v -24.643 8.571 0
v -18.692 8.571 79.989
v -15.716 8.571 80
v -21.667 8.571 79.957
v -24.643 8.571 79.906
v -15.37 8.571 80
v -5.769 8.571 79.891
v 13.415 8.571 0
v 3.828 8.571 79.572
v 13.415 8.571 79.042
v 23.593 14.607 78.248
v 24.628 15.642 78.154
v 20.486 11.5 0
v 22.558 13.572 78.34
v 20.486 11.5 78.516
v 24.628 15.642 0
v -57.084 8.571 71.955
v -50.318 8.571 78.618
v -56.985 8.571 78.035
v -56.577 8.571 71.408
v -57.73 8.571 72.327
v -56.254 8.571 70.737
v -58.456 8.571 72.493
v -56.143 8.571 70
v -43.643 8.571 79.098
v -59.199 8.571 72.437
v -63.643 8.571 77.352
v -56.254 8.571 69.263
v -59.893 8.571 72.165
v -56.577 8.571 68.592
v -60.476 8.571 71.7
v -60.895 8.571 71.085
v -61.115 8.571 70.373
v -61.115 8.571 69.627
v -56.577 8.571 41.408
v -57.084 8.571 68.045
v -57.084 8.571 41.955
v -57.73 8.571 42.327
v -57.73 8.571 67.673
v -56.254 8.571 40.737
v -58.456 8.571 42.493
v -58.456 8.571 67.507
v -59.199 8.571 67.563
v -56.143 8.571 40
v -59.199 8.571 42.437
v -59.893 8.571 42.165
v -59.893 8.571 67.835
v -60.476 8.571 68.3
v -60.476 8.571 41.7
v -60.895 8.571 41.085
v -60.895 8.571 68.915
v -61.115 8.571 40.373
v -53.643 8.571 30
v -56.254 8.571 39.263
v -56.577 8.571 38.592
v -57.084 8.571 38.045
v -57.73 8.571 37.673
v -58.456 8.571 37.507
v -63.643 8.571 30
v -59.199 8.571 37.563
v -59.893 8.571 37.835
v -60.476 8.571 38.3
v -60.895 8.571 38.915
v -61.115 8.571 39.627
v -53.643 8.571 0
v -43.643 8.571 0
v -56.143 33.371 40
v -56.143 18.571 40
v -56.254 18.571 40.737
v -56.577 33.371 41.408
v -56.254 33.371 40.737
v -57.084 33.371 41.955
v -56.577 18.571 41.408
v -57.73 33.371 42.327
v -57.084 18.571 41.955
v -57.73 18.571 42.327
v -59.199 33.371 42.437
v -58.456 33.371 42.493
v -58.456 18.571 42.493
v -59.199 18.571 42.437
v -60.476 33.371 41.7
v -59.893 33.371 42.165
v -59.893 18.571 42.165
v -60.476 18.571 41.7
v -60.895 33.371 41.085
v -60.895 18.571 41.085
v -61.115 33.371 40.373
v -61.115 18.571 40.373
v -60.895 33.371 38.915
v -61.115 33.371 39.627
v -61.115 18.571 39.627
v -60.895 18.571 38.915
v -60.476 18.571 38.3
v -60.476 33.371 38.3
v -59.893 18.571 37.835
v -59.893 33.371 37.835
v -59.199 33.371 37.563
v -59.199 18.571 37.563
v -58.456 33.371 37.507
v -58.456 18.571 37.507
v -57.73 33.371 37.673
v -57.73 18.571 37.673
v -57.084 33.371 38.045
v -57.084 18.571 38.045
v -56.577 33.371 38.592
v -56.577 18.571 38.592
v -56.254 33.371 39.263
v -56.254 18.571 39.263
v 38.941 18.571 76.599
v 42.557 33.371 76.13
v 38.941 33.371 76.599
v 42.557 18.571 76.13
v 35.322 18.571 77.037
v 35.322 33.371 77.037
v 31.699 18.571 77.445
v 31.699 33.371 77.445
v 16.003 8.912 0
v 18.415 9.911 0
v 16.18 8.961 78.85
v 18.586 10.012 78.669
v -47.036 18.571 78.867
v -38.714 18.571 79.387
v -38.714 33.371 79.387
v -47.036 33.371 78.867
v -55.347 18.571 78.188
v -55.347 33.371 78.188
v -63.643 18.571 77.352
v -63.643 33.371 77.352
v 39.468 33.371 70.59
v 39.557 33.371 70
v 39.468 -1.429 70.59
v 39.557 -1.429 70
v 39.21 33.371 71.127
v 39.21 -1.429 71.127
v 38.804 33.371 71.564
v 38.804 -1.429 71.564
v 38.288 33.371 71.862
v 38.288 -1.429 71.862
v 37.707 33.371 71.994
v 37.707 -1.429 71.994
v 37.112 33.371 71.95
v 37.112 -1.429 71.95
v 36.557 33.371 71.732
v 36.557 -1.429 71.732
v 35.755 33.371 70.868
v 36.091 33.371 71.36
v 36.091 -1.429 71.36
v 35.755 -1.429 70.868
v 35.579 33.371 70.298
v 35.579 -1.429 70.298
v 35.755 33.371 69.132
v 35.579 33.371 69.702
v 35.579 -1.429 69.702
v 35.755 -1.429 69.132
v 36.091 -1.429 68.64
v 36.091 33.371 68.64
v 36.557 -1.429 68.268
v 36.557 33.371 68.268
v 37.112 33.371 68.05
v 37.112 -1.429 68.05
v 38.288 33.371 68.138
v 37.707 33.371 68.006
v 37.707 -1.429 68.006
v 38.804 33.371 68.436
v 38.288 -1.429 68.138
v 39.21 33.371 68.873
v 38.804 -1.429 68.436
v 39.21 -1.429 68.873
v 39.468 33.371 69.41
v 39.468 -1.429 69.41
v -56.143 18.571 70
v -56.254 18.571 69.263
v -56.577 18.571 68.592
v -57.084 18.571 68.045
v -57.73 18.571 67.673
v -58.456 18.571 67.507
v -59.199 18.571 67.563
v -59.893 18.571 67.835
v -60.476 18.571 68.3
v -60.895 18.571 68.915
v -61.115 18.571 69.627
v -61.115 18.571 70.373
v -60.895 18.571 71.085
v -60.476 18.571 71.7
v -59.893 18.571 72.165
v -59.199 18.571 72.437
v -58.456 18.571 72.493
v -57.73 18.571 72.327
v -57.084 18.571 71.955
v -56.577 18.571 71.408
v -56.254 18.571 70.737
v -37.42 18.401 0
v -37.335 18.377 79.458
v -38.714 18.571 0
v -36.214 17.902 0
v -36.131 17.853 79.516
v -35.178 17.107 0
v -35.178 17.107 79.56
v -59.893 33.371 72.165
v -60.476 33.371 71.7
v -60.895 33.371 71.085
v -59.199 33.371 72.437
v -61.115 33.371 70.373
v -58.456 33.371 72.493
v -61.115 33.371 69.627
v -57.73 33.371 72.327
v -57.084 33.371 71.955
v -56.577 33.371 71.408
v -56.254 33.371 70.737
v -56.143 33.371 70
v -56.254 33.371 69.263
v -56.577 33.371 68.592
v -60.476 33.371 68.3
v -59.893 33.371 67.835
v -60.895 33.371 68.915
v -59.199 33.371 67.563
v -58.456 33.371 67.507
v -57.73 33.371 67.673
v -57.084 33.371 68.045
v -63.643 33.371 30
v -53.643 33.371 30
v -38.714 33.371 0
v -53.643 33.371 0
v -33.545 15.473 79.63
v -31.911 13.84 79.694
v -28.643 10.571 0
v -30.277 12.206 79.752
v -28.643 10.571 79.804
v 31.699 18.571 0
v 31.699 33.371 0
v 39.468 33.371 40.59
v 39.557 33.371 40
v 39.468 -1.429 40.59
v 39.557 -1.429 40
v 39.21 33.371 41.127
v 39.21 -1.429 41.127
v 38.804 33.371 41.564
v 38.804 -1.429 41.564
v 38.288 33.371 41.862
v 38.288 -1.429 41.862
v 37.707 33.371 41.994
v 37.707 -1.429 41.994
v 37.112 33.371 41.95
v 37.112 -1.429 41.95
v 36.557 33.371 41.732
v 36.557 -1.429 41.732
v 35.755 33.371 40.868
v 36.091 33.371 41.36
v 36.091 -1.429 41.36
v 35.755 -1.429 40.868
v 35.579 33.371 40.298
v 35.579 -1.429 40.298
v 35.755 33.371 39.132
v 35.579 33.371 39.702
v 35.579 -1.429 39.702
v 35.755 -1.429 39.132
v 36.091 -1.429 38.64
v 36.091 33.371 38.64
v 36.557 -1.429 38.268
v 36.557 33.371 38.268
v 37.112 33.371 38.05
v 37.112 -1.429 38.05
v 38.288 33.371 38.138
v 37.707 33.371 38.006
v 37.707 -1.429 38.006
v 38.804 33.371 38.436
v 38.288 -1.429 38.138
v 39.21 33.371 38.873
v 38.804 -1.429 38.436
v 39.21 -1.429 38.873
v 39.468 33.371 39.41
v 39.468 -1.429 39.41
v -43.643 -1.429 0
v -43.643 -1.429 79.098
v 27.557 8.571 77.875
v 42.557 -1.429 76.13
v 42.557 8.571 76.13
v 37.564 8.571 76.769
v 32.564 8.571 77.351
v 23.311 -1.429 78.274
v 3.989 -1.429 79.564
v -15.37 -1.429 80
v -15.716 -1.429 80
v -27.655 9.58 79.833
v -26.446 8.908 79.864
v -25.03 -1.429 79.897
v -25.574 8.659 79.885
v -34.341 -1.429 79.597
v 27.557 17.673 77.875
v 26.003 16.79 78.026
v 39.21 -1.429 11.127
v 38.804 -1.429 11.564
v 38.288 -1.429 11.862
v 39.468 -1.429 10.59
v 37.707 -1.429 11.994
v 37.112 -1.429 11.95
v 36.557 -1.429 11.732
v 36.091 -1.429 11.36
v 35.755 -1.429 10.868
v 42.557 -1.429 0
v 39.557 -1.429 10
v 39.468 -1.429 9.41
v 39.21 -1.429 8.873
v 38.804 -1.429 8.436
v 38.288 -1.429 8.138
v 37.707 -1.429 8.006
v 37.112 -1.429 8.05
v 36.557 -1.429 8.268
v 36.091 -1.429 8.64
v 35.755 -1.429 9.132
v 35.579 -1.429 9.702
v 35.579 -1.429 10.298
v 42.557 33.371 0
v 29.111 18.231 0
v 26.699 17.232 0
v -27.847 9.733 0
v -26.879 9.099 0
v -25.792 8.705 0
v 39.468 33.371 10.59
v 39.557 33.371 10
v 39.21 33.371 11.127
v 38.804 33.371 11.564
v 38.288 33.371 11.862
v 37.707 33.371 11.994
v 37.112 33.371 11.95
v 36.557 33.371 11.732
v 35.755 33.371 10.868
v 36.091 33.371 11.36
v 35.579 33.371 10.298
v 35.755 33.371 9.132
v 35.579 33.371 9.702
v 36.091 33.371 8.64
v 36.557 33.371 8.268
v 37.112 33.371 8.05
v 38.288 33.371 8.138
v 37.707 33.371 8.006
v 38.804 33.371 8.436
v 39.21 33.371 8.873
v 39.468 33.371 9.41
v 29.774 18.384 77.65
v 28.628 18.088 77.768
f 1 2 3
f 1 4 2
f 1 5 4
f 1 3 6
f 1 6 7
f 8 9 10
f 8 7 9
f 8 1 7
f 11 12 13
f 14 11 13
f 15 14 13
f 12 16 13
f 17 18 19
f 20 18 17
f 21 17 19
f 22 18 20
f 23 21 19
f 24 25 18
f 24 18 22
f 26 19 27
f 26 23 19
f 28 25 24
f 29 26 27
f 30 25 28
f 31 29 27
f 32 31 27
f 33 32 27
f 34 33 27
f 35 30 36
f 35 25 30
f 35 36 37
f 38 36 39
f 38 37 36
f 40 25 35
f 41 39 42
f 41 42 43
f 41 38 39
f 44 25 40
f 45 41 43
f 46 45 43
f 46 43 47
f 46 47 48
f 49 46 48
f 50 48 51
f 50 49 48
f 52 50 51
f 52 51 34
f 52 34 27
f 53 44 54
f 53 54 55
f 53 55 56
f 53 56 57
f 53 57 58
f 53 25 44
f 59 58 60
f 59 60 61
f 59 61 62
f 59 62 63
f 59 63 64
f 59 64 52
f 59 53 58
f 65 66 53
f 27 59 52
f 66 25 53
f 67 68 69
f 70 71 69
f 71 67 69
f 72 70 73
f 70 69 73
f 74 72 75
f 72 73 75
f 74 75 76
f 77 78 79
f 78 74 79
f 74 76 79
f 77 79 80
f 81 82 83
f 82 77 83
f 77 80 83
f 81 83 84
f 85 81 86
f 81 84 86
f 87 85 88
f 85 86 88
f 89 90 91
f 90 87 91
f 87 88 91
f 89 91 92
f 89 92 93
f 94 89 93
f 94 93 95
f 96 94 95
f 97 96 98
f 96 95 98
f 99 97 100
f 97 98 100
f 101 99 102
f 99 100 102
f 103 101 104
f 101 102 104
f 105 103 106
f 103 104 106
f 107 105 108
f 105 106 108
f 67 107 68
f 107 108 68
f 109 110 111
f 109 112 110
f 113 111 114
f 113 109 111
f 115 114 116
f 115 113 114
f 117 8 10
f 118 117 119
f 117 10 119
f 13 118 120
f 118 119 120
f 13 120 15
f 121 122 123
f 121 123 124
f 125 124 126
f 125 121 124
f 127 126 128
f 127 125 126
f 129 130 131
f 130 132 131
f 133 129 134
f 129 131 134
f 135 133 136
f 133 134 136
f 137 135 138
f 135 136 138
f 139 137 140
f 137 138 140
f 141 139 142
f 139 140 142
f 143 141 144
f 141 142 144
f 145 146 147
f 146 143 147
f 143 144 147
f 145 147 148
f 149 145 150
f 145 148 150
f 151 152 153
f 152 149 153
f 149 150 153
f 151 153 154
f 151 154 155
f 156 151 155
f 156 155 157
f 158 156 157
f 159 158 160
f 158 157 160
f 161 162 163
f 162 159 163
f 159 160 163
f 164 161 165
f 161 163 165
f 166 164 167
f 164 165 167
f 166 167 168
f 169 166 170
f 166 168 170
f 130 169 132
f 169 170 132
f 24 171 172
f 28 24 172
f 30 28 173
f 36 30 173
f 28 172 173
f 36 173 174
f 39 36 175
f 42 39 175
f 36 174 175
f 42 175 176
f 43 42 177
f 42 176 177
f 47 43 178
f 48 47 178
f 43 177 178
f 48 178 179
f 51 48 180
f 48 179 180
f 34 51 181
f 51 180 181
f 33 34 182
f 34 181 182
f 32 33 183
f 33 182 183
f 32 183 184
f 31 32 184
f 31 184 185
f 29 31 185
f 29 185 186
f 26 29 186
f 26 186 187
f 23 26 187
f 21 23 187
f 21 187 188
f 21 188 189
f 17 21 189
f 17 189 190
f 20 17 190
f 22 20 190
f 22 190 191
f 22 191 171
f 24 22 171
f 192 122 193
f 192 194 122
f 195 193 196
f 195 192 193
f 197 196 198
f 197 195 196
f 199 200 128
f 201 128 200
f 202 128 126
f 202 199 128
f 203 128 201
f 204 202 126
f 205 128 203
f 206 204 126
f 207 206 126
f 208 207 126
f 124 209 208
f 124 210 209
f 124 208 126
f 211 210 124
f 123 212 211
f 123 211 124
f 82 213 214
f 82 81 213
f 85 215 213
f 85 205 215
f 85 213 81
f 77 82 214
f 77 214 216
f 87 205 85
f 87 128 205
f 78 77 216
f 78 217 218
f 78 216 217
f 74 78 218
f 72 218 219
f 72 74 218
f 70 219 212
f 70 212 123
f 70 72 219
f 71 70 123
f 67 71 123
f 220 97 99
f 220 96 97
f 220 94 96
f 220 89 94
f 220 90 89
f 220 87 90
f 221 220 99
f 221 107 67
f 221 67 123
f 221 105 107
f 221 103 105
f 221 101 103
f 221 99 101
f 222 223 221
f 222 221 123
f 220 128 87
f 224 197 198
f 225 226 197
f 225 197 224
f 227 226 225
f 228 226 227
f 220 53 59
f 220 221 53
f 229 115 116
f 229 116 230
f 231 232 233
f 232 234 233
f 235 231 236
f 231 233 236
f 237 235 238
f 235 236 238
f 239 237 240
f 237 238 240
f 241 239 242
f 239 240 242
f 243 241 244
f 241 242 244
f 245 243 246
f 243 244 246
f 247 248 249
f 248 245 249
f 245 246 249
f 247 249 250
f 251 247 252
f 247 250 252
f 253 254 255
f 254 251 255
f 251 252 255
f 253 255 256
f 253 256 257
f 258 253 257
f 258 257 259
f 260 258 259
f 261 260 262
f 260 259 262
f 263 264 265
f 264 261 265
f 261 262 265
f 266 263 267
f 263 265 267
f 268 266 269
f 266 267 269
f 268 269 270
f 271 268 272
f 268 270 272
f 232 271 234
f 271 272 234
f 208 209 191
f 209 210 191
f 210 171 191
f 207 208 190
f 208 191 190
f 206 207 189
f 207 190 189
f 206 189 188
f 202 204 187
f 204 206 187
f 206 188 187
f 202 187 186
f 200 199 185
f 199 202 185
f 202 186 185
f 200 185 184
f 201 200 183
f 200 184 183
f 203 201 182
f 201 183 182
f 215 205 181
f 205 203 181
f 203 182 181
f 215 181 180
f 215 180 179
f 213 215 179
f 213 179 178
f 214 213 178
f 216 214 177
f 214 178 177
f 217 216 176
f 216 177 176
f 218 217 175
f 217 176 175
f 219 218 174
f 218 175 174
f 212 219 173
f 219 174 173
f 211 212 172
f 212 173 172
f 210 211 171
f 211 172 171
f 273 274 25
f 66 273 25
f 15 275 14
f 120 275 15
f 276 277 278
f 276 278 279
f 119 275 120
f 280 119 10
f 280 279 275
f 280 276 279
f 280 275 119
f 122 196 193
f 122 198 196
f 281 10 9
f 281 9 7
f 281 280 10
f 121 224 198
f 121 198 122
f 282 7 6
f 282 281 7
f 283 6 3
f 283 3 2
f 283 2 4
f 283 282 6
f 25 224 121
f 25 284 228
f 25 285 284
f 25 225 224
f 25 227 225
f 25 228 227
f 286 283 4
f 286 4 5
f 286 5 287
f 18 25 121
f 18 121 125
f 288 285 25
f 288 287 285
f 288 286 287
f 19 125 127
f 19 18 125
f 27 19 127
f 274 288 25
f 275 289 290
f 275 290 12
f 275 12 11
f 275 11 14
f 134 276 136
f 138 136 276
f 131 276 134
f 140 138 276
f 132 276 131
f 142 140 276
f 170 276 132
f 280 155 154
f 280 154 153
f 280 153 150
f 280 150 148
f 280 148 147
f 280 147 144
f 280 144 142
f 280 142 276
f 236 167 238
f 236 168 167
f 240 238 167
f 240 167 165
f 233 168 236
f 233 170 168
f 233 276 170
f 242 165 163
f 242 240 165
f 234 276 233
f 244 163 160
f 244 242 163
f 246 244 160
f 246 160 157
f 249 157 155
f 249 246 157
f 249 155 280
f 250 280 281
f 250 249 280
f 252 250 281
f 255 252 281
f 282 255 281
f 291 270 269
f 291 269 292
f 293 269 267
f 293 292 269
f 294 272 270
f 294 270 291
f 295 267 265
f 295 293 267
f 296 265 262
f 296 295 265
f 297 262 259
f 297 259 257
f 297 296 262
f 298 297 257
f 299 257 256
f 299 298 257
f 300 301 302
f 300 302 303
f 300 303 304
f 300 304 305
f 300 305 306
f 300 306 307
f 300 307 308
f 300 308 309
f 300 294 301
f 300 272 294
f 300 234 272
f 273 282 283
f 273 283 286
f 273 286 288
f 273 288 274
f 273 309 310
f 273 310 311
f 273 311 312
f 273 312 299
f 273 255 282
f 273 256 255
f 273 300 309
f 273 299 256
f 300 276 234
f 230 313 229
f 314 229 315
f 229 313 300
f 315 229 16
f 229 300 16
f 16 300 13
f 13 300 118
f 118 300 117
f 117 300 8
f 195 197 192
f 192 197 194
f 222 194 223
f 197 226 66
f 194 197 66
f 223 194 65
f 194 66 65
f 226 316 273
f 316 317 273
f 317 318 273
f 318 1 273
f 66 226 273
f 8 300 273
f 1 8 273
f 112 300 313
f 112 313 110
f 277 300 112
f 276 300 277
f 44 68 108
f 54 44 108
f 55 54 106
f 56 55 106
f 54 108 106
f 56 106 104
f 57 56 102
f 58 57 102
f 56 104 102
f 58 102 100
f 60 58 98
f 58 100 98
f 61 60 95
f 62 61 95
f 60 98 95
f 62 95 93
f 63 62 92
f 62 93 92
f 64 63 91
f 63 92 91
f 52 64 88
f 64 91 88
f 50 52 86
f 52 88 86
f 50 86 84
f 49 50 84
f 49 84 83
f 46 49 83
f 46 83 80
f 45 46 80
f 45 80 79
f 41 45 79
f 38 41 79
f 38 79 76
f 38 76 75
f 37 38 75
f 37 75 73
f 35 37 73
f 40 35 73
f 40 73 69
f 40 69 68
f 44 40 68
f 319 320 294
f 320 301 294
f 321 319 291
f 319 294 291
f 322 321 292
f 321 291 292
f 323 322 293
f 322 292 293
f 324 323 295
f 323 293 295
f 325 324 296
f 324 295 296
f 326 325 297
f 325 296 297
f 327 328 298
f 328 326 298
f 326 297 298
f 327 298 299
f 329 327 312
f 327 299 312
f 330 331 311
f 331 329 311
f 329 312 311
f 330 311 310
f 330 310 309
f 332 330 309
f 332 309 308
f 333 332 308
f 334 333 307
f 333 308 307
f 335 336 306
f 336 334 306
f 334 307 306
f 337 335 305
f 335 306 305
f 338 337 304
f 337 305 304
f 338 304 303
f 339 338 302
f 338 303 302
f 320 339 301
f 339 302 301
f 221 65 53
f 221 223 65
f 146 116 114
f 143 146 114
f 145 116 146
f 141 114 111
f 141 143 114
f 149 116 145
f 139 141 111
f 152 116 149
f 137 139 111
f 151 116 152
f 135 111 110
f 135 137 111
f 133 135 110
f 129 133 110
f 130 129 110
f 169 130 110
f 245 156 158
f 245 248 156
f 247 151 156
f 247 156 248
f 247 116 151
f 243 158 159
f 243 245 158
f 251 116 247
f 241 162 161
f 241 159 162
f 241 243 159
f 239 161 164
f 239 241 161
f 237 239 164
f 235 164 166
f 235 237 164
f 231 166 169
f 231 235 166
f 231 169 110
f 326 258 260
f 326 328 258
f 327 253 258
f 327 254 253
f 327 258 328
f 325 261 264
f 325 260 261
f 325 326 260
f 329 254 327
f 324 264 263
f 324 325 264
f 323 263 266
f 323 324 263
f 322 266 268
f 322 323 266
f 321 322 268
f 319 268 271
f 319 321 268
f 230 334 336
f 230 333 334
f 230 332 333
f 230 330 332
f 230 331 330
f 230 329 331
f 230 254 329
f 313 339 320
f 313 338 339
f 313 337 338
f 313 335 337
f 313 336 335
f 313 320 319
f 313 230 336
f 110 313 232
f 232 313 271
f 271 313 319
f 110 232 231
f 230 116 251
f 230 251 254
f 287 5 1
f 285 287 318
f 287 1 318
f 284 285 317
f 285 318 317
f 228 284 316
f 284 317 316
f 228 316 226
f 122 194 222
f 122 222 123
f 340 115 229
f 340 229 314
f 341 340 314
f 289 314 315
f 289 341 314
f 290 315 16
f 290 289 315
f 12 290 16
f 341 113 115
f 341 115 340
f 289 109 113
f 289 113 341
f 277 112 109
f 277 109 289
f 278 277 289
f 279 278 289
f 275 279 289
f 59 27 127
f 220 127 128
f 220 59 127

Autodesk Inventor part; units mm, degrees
ref_plane "YZ Plane" through (0, 0, 0) normal (1, 0, 0) x (0, 1, 0)
ref_plane "XZ Plane" through (0, 0, 0) normal (0, 1, 0) x (-1, 0, 0)
ref_plane "XY Plane" through (0, 0, 0) normal (0, 0, 1) x (1, 0, 0)
sketch "Sketch1" plane through (0, 0, 0) normal (0, 0, 1) x (1, 0, 0)
  line L0 (-43.6429, 8.5714) -> (-63.6429, 8.5714)
  line L1 (-63.6429, 8.5714) -> (-63.6429, 18.5714)
  line L2 (-63.6429, 18.5714) -> (-28.6429, 18.5714)
  line L3 (-28.6429, 18.5714) -> (-28.6429, 8.5714)
  line L4 (-28.6429, 8.5714) -> (42.5571, 8.5714)
  line L5 (42.5571, 8.5714) -> (42.5571, -1.4286)
  line L6 (42.5571, -1.4286) -> (-43.6429, -1.4286)
  line L7 (-43.6429, -1.4286) -> (-43.6429, 8.5714)
  point P0 (0, 0)
  dimension "d0" = 10
  dimension "d1" = 10
  dimension "d2" = 20
  dimension "d3" = 86.2
  dimension "d4" = 15
extrude "Extrusion1" add sketch "Sketch1" along normal blind 80
chamfer "Chamfer1" distance 8 angle 45 1 edges at (-28.6429, 18.5714, 40)
fillet "Fillet1" radius 5 2 edges at (-36.6429, 18.5714, 40) (-28.6429, 8.5714, 40)
sketch "Sketch2" plane through (-63.6429, 18.5714, 80) normal (0, 1, 0) x (1, 0, 0)
  circle A0 centre (5, 10) radius 2.5
  circle A1 centre (5, 40) radius 2.5
  line L0 (24.9289, 0) -> (0, 0) projected
  line L1 (0, 80) -> (0, 0) projected
  line L2 (0, 80) -> (20, 80) projected
  line L3 (20, 80) -> (20, 0) projected
  line L4 (0, 80) -> (10, 80)
  line L5 (10, 80) -> (10, 50)
  line L6 (10, 50) -> (0, 50)
  line L7 (0, 50) -> (0, 80)
  point P0 (63.6429, 80)
  point P1 (20, 50)
  point P2 (0, 50)
  point P3 (10, 80)
  dimension "d11" = 10
  dimension "d12" = 40
  dimension "d13" = 5
  dimension "d14" = 5
  dimension "d15" = 5
  dimension "d16" = 5
  dimension "d31" = 10
extrude "Extrusion2" cut sketch "Sketch2" against normal blind 10 contours A0 | A1 | L1 L2 L5 L6
sketch "Sketch3" plane through (42.5571, 8.5714, 80) normal (0, 1, 0) x (1, 0, 0)
  circle A0 centre (-5, 10) radius 2
  circle A1 centre (-5, 40) radius 2
  circle A2 centre (-5, 70) radius 2
  line L0 (0, 80) -> (0, 0) projected
  line L1 (0, 80) -> (-67.2, 80) projected
  line L2 (0, 0) -> (-67.2, 0) projected
  point P0 (-42.5571, 80)
  dimension "d20" = 4
  dimension "d21" = 4
  dimension "d22" = 4
  dimension "d23" = 5
  dimension "d24" = 5
  dimension "d25" = 5
  dimension "d26" = 10
  dimension "d27" = 40
  dimension "d28" = 10
extrude "Extrusion3" cut sketch "Sketch3" against normal blind 10
sketch "Sketch4" plane through (42.5571, 8.5714, 80) normal (0, 1, 0) x (1, 0, 0)
  arc A0 (-125.8221, 5.2659) -> (2.953, 4.275) centre (-58.1, 438.1) ccw
  line L0 (0, 0) -> (-67.2, 0) projected
  line L1 (0, 80) -> (0, 0) projected
  line L2 (2.953, 4.275) -> (3.8116, -7.869)
  line L3 (3.8116, -7.869) -> (-122.3226, -7.869)
  line L4 (-122.3226, -7.869) -> (-125.8221, 5.2659)
  point P0 (-42.5571, 80)
  point P1 (0, 3.8696)
  point P2 (-58.1, 0)
  point P3 (-0.5169, 0)
  dimension "d32" = 876.2
  dimension "d33" = 0
  dimension "d34" = 58.1
extrude "Extrusion4" cut sketch "Sketch4" along normal through all both and the other way through all
sketch "Sketch5" plane through (-24.6429, 8.5714, 0) normal (0, 1, 0) x (1, 0, 0)
  circle A0 centre (62.2, -70) radius 2 projected
  circle A1 centre (62.2, -70) radius 2
  circle A2 centre (62.2, -40) radius 2 projected
  circle A3 centre (62.2, -40) radius 2
  circle A4 centre (62.2, -10) radius 2 projected
  circle A5 centre (62.2, -10) radius 2
  line L0 (67.2, 0) -> (67.2, -80) projected
  line L1 (67.2, -76.1304) -> (67.2, 0)
  line L2 (67.2, 0) -> (52.2, 0)
  line L3 (67.2, 0) -> (0, 0) projected
  line L4 (52.2, 0) -> (52.2, -77.8748)
  arc A6 (-19, -79.0979) -> (67.2, -76.1304) centre (9.1, 358.1) ccw projected
  arc A7 (-55.9, -73.5326) -> (94.1, -73.5326) centre (19.1, 358.0999) ccw projected
  arc A8 (-55.9, -73.5326) -> (94.1, -73.5326) centre (19.1, 358.0999) ccw projected
  arc A9 (-55.9, -73.5326) -> (94.1, -73.5326) centre (19.1, 358.0999) ccw projected
  circle A10 centre (-30.9, 438.0999) radius 2 projected
  circle A11 centre (-30.9, 308.0999) radius 2 projected
  circle A12 centre (69.1, 278.0999) radius 2 projected
  circle A13 centre (69.1, 308.0999) radius 2 projected
  circle A14 centre (69.1, 468.0999) radius 2 projected
  circle A15 centre (-30.9, 468.0999) radius 2 projected
  circle A16 centre (69.1, 408.0999) radius 2 projected
  circle A17 centre (-30.9, 248.0999) radius 2 projected
  circle A18 centre (69.1, 248.0999) radius 2 projected
  circle A19 centre (-30.9, 278.0999) radius 2 projected
  circle A20 centre (-30.9, 408.0999) radius 2 projected
  circle A21 centre (69.1, 438.0999) radius 2 projected
  circle A22 centre (-24, 756.1997) radius 2 projected
  circle A23 centre (62.2, -10) radius 2 projected
  circle A24 centre (62.2, -70) radius 2 projected
  circle A25 centre (-34, -40) radius 2.5 projected
  circle A26 centre (-24, 726.1997) radius 2 projected
  circle A27 centre (-24, 786.1997) radius 2 projected
  circle A28 centre (62.2, -40) radius 2 projected
  circle A29 centre (-34, -70) radius 2.5 projected
  circle A30 centre (72.2, 756.1997) radius 2.5 projected
  circle A31 centre (72.2, 786.1997) radius 2.5 projected
  circle A32 centre (-0.9, 338.0999) radius 2.5 projected
  circle A33 centre (39.1, 338.0999) radius 2.5 projected
  circle A34 centre (-0.9, 378.0999) radius 2.5 projected
  circle A35 centre (39.1, 378.0999) radius 2.5 projected
  circle A36 centre (19.1, 358.0999) radius 7.5 projected
  arc A37 (-55.9, -73.5326) -> (94.1, -73.5326) centre (19.1, 358.0999) ccw projected
  line L5 (94.1, -73.5326) -> (94.1, 789.7324) projected
  arc A38 (94.1, 789.7324) -> (-55.9, 789.7324) centre (19.1, 358.0999) ccw projected
  line L6 (-55.9, 789.7324) -> (-55.9, -73.5326) projected
  circle A39 centre (69.1, 158.0999) radius 2 projected
  circle A40 centre (-30.9, 38.0999) radius 2 projected
  circle A41 centre (69.1, 558.0999) radius 2 projected
  circle A42 centre (69.1, 518.0999) radius 2 projected
  circle A43 centre (-30.9, 638.0999) radius 2 projected
  circle A44 centre (69.1, 638.0999) radius 2 projected
  circle A45 centre (-30.9, 598.0999) radius 2 projected
  circle A46 centre (69.1, 118.0999) radius 2 projected
  circle A47 centre (-30.9, 118.0999) radius 2 projected
  circle A48 centre (69.1, 78.0999) radius 2 projected
  circle A49 centre (-30.9, 198.0999) radius 2 projected
  circle A50 centre (69.1, 198.0999) radius 2 projected
  circle A51 centre (-30.9, 678.0999) radius 2 projected
  circle A52 centre (-30.9, 558.0999) radius 2 projected
  circle A53 centre (69.1, 678.0999) radius 2 projected
  circle A54 centre (-30.9, 518.0999) radius 2 projected
  circle A55 centre (69.1, 598.0999) radius 2 projected
  circle A56 centre (69.1, 38.0999) radius 2 projected
  circle A57 centre (-30.9, 158.0999) radius 2 projected
  circle A58 centre (-30.9, 78.0999) radius 2 projected
  circle A59 centre (29.9074, 423.6249) radius 2 projected
  circle A60 centre (-0.0926, 473.6249) radius 2 projected
  circle A61 centre (-0.0926, 423.6249) radius 2 projected
  circle A62 centre (29.9074, 473.6249) radius 2 projected
  point P0 (24.6429, 0)
  point P1 (67.0008, -76.157)
  dimension "d37" = 15
extrude "Extrusion5" add sketch "Sketch5" along normal blind 10 contours L0 A6 L4 L2
chamfer "Chamfer2" distance 10 angle 45 1 edges at (27.5571, 8.5714, 38.9374)
fillet "Fillet2" radius 10 3 edges at (17.5572, 8.5714, 39.3739) (27.5571, 18.5713, 38.9374) (27.5571, 18.5714, 38.9374)
sketch "Sketch6" plane through (-24.6429, 18.5714, 0) normal (0, 1, 0) x (1, 0, 0)
  circle A0 centre (62.2, -70) radius 2 projected
  circle A1 centre (62.2, -40) radius 2 projected
  circle A2 centre (62.2, -10) radius 2 projected
  line L0 (56.3421, -77.4454) -> (56.3421, 0) projected
  arc A3 (56.3421, -77.4454) -> (67.2, -76.1304) centre (9.1, 358.1) ccw projected
  line L1 (67.2, -76.1304) -> (67.2, 0) projected
  line L2 (67.2, 0) -> (56.3421, 0) projected
  circle A4 centre (-34, -70) radius 2.5 projected
  circle A5 centre (-34, -40) radius 2.5 projected
  arc A6 (-39, -77.3515) -> (-14.0711, -79.3868) centre (9.1, 358.1) ccw projected
  line L3 (-14.0711, 0) -> (-14.0711, -79.3868) projected
  line L4 (-14.0711, 0) -> (-29, 0) projected
  line L5 (-29, 0) -> (-29, -30) projected
  line L6 (-29, -30) -> (-39, -30) projected
  line L7 (-39, -30) -> (-39, -77.3515) projected
  point P0 (24.6429, 0)
extrude "Extrusion6" add sketch "Sketch6" along normal blind 14.8
properties part number "ReleaseMec2.0TopPlate"
